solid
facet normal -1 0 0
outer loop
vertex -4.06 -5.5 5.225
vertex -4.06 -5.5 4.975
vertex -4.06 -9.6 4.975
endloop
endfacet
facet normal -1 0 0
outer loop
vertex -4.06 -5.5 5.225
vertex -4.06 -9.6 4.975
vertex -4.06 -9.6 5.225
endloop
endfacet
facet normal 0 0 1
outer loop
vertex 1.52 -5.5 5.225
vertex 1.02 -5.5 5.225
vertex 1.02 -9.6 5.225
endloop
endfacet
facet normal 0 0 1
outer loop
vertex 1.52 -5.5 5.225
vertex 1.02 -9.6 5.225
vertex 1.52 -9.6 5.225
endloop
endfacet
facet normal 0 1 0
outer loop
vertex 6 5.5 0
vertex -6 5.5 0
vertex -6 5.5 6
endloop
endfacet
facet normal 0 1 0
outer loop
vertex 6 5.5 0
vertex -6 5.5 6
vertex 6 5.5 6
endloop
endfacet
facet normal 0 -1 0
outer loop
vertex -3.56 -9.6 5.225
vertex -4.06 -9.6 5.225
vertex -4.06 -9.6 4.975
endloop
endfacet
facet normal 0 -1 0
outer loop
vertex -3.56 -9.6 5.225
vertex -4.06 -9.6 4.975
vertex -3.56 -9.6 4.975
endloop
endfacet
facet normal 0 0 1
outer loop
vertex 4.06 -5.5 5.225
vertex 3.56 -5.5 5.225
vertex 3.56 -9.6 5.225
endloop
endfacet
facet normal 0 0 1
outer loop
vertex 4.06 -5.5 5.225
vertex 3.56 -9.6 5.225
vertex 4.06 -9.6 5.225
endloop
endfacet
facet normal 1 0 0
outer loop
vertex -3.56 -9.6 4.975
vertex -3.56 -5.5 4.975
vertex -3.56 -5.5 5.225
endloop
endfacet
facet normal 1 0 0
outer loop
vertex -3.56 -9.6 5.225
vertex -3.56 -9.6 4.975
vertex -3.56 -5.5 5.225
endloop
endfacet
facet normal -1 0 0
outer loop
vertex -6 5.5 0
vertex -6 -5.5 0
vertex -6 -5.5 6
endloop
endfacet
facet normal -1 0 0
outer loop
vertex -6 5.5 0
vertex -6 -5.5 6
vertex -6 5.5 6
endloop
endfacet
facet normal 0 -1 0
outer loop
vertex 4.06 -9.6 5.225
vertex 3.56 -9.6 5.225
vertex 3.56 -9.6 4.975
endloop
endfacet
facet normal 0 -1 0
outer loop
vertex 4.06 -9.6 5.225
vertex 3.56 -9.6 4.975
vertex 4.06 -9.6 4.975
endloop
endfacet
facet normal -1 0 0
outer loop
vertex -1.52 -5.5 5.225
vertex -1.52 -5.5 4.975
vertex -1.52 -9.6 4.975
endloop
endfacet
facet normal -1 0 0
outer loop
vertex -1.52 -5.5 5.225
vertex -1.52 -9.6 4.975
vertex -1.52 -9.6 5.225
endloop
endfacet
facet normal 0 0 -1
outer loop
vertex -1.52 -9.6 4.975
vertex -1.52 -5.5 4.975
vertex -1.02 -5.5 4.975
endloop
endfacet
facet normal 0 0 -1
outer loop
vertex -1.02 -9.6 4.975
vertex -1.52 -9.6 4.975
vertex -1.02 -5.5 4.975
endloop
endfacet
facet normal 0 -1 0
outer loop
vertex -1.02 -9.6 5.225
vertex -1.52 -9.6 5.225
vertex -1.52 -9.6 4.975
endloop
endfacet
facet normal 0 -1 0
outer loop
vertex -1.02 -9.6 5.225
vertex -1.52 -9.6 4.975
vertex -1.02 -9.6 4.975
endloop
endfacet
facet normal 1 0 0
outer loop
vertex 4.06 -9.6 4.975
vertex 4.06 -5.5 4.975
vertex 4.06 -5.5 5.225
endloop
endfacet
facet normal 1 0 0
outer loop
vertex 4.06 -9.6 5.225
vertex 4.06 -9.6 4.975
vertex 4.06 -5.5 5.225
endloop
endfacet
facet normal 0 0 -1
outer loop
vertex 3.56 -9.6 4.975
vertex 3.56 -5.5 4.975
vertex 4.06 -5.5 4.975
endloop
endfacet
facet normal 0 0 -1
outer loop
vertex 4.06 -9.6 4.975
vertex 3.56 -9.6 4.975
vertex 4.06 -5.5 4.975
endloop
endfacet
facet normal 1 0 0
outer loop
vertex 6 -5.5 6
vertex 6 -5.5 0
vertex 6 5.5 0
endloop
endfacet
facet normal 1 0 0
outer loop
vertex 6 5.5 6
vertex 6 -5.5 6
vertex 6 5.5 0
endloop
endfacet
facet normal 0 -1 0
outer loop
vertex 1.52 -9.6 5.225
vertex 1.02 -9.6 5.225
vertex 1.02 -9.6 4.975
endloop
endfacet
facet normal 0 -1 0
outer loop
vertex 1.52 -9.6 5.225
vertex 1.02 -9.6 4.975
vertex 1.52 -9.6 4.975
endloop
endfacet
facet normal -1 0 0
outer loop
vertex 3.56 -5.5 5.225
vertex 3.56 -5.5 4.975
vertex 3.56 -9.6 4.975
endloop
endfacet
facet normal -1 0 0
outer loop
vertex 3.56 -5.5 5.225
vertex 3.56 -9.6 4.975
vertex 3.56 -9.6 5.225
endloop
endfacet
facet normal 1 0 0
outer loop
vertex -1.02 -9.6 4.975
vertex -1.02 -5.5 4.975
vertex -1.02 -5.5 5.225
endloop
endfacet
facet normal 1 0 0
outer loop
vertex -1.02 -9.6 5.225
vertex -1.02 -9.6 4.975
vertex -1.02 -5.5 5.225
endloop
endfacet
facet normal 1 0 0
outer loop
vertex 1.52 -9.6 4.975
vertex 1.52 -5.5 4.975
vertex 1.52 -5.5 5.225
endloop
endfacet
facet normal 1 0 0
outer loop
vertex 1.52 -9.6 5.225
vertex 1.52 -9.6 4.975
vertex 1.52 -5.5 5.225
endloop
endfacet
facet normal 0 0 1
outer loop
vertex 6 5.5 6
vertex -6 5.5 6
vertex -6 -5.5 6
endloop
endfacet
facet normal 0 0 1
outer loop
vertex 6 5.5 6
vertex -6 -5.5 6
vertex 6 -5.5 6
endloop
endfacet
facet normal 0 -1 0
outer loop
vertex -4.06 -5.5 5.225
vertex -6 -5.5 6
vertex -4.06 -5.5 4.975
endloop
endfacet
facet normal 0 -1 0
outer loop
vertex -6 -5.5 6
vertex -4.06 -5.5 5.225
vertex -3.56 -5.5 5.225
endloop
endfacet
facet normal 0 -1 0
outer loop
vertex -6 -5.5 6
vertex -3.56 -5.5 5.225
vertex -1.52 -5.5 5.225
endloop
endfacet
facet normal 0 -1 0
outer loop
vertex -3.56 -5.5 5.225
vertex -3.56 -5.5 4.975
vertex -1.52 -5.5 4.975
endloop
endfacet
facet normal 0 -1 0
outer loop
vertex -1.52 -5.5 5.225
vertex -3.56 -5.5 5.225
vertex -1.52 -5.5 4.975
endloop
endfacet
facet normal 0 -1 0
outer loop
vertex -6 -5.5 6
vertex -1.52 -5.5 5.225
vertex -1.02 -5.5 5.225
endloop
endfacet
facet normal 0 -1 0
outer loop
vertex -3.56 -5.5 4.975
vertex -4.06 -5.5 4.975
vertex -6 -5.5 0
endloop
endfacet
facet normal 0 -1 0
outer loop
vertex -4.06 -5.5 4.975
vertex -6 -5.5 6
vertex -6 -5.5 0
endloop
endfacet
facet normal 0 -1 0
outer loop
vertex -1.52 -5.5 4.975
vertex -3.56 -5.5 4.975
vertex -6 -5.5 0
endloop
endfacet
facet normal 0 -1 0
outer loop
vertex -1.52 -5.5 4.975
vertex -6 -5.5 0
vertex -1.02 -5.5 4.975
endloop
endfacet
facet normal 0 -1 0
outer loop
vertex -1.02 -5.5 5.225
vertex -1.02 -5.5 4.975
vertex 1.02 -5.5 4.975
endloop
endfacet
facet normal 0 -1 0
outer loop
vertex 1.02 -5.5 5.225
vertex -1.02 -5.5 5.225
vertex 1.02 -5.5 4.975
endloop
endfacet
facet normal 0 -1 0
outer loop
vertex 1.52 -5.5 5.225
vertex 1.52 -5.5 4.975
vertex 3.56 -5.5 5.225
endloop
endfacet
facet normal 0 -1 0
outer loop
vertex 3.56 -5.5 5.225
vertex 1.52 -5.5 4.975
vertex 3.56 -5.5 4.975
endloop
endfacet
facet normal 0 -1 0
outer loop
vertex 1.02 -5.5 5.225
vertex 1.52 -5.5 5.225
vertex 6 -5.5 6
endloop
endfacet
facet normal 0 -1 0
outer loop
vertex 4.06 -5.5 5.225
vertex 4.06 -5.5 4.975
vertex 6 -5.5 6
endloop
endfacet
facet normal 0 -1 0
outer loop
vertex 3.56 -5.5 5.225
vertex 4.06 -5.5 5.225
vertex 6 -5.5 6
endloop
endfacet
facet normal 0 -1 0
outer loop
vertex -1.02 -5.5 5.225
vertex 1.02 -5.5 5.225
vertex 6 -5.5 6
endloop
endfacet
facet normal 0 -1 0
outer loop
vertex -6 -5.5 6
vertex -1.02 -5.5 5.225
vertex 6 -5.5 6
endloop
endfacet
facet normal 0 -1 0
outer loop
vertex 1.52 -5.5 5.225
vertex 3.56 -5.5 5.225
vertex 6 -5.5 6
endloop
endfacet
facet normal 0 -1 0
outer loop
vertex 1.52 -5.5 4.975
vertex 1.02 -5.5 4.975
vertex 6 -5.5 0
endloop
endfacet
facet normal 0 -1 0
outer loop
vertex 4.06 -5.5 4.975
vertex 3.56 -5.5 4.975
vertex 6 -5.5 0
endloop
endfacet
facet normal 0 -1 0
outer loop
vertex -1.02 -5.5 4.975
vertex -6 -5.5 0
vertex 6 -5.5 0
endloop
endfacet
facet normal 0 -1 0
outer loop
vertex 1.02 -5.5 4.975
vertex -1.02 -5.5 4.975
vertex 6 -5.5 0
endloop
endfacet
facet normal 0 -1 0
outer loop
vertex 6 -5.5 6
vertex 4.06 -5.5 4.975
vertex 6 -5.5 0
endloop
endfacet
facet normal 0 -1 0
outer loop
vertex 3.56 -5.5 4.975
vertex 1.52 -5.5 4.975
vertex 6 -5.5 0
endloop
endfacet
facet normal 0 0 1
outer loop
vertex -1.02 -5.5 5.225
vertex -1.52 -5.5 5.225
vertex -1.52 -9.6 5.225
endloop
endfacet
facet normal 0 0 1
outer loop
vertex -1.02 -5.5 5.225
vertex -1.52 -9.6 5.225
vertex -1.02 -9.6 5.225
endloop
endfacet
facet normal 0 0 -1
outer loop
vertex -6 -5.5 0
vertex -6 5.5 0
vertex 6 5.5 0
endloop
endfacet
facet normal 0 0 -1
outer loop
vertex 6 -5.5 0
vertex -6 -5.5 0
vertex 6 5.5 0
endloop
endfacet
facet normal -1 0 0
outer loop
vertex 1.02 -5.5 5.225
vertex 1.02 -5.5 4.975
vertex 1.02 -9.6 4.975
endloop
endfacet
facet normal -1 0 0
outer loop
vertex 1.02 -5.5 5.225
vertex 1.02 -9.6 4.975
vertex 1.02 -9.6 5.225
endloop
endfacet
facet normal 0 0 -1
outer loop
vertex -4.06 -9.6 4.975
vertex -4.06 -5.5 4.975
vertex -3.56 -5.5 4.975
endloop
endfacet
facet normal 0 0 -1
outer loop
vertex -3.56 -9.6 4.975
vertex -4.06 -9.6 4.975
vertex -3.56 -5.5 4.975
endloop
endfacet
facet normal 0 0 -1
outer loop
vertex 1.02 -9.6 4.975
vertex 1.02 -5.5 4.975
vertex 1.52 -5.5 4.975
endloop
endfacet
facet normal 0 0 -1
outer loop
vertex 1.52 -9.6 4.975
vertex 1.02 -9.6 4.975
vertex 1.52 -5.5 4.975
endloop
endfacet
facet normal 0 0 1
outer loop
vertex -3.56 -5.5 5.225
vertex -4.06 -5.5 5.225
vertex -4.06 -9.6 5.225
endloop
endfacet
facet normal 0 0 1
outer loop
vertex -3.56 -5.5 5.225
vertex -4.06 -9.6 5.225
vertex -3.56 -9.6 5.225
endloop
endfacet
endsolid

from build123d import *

# Parameters (mm, degrees)
SKETCH1_W           = 12
SKETCH1_H           = 11
BOSS_EXTRUDE1_DEPTH = 6
SKETCH2_W           = 0.5
SKETCH2_H           = 0.25
BOSS_EXTRUDE2_DEPTH = 4.1


with BuildPart() as part:
    # Sketch1 → Boss-Extrude1 (new body)
    with BuildSketch(Plane.XY):
        Rectangle(SKETCH1_W, SKETCH1_H)
    extrude(amount=BOSS_EXTRUDE1_DEPTH)

    # Sketch2 → Boss-Extrude2 (add)
    with BuildSketch(Plane.XZ.offset(5.5)):
        with Locations((1.27, 5.1)):
            Rectangle(SKETCH2_W, SKETCH2_H)
        with Locations((3.81, 5.1)):
            Rectangle(SKETCH2_W, SKETCH2_H)
        with Locations((-1.27, 5.1)):
            Rectangle(SKETCH2_W, SKETCH2_H)
        with Locations((-3.81, 5.1)):
            Rectangle(SKETCH2_W, SKETCH2_H)
    extrude(amount=BOSS_EXTRUDE2_DEPTH)


solid = part.part
